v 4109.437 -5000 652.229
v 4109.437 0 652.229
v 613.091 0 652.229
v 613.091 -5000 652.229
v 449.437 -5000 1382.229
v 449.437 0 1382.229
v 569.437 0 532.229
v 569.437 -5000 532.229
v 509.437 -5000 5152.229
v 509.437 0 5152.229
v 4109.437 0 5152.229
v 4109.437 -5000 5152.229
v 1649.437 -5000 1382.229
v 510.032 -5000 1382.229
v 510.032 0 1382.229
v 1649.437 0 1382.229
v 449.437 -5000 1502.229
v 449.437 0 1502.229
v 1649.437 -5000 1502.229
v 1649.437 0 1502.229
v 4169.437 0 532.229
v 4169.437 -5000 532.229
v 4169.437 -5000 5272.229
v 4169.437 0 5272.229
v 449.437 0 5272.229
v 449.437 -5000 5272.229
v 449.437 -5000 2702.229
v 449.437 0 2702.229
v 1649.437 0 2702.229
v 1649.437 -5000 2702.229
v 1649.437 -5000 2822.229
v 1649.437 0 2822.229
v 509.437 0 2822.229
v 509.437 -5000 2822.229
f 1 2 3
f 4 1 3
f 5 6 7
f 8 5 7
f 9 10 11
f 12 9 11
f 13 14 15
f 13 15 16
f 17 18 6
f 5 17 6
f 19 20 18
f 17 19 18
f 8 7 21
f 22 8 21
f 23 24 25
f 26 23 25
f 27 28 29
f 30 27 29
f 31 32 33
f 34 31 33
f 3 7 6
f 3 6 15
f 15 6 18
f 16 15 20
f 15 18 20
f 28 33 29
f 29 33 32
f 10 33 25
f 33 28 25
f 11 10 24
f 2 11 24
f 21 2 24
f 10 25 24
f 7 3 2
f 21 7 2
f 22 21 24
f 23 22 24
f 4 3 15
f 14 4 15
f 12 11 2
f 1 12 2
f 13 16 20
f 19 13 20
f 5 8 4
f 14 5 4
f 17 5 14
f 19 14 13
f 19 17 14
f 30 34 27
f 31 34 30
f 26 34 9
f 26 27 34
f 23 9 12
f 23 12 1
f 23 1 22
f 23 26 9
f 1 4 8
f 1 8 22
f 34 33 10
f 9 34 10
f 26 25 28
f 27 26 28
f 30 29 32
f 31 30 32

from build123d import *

# Parameters (mm, degrees)
F1_DEPTH = 5000


with BuildPart() as f1:
    # F0 (on Front) → F1 (new body)
    with BuildSketch(Plane.XZ):
        Polygon((449.437401, 1382.228501), (569.437401, 532.228501), (4169.437401, 532.228501), (4169.437401, 5272.228501), (449.437401, 5272.228501), (449.437401, 2702.228501), (1649.437401, 2702.228501), (1649.437401, 2822.228501), (509.437401, 2822.228501), (509.437401, 5152.228501), (4109.437401, 5152.228501), (4109.437401, 652.228501), (613.091199, 652.228501), (510.032375, 1382.228501), (1649.437401, 1382.228501), (1649.437401, 1502.228501), (449.437401, 1502.228501), align=None)
    extrude(amount=F1_DEPTH)


solid = f1.part
